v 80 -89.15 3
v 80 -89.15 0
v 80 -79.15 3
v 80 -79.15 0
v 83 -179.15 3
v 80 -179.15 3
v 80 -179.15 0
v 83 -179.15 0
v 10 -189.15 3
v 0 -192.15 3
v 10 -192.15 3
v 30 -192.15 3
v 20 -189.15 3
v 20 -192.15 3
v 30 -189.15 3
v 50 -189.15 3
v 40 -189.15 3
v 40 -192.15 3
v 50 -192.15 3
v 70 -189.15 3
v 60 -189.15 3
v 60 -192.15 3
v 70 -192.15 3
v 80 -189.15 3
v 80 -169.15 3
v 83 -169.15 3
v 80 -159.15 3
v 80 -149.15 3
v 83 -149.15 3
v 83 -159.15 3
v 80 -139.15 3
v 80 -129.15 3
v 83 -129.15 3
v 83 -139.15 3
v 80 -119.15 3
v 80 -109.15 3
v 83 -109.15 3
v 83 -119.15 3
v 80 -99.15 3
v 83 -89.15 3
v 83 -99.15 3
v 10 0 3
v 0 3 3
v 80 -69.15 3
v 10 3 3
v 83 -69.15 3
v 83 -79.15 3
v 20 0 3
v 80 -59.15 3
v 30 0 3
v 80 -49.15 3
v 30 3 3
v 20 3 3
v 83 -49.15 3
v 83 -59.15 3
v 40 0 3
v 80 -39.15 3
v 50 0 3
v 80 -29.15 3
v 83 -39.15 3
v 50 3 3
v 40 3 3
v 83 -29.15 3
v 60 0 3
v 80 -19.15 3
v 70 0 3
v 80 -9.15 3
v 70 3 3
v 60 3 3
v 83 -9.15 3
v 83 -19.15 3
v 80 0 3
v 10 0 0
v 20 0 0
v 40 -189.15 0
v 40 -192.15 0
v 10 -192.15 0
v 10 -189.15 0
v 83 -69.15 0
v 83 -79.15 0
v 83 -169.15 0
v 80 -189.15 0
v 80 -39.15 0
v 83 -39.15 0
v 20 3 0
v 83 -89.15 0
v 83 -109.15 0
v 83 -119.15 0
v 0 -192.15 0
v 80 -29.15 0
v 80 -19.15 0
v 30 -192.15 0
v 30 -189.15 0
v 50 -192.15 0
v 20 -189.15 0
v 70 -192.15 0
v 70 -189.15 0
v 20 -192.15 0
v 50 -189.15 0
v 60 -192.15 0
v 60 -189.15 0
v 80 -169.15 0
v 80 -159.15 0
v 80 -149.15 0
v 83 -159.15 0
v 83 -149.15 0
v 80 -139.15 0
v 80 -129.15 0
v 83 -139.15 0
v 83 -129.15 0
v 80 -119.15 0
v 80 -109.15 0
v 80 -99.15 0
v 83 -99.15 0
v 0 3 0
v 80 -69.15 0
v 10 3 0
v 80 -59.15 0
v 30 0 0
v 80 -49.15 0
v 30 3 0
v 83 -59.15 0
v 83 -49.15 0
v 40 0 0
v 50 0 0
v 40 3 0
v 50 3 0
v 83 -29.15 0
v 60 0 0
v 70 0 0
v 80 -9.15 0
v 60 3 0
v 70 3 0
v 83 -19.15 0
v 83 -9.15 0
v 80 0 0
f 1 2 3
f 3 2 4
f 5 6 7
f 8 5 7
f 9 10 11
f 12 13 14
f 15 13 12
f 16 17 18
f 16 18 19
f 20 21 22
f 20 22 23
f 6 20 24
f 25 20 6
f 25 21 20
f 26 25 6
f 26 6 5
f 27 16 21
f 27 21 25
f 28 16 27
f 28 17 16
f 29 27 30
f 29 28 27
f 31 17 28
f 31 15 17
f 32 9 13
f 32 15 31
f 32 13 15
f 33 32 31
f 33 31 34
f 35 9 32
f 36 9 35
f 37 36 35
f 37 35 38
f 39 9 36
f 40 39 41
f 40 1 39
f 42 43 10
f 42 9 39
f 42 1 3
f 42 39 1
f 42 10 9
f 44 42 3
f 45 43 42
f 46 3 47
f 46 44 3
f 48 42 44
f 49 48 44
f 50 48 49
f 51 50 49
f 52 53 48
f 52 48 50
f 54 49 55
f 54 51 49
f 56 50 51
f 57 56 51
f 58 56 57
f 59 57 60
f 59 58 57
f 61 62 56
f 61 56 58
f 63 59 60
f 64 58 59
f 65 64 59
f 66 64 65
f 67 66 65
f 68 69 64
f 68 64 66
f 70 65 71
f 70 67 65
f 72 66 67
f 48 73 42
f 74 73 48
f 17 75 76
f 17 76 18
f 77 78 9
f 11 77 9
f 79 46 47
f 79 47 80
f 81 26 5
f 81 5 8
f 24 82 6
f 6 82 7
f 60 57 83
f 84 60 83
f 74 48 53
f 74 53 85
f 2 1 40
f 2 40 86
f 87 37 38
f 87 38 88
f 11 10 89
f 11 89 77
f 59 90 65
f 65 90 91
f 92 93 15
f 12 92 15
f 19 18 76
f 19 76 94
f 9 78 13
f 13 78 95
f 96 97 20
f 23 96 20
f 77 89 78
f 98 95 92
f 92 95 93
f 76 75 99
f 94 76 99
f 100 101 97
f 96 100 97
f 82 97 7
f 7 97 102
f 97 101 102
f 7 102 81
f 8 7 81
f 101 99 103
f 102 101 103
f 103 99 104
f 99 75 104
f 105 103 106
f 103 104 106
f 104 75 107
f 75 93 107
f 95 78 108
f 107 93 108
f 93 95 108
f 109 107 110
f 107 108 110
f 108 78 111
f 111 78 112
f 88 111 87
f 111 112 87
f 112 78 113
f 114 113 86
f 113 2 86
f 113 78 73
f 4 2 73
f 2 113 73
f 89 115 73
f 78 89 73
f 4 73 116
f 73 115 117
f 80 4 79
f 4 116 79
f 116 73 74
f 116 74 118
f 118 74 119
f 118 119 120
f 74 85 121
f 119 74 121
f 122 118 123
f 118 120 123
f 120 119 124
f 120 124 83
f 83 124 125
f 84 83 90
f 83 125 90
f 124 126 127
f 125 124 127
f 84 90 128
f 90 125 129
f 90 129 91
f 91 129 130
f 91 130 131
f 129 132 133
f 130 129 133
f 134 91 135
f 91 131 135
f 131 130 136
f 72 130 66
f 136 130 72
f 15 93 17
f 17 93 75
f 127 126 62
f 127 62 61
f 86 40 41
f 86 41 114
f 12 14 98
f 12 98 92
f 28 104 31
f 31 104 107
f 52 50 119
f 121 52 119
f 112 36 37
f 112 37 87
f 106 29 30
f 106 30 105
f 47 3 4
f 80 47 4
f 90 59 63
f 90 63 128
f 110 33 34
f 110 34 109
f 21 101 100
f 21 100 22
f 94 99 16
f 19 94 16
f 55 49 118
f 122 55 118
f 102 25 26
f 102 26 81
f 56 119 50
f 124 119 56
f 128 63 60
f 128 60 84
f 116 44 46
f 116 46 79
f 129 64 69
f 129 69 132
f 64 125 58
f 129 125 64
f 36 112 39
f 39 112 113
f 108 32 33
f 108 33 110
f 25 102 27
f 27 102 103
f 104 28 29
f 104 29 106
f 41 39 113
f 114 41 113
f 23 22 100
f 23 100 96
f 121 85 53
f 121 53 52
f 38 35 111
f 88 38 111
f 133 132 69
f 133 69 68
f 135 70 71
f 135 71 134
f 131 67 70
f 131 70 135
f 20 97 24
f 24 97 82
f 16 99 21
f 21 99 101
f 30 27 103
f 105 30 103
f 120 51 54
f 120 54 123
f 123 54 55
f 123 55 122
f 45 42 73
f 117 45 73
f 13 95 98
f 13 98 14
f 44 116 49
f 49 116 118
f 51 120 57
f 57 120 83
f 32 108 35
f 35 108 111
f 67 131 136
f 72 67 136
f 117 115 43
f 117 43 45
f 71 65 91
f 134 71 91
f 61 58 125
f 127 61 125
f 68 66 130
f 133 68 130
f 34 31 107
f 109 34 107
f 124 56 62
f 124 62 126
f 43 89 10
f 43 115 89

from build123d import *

# Parameters (mm, degrees)
ESQUISSE1_W                = 80
ESQUISSE1_H                = 189.15
BOSS_EXTRU_1_DEPTH         = 3
ESQUISSE3_W                = 10
ESQUISSE3_H                = 3
BOSS_EXTRU_2_DEPTH         = 3
R_P_TITION_LIN_AIRE1_COUNT = 4
R_P_TITION_LIN_AIRE1_PITCH = 20
ESQUISSE4_W                = 10
ESQUISSE4_H                = 3
BOSS_EXTRU_3_DEPTH         = 3
R_P_TITION_LIN_AIRE2_COUNT = 4
R_P_TITION_LIN_AIRE2_PITCH = 20
ESQUISSE5_W                = 3
ESQUISSE5_H                = 10
BOSS_EXTRU_4_DEPTH         = 3
R_P_TITION_LIN_AIRE3_COUNT = 9
R_P_TITION_LIN_AIRE3_PITCH = 20


with BuildPart() as part:
    # Esquisse1 → Boss.-Extru.1 (new body)
    with BuildSketch(Plane.XY):
        with Locations((40, -94.575)):
            Rectangle(ESQUISSE1_W, ESQUISSE1_H)
    extrude(amount=BOSS_EXTRU_1_DEPTH)

    # Esquisse3 → Boss.-Extru.2 (add)
    with BuildSketch(Plane(origin=(0, 0, 0), x_dir=(1, 0, 0), z_dir=(0, 1, 0))):
        with Locations((5, -1.5)):
            Rectangle(ESQUISSE3_W, ESQUISSE3_H)
    boss_extru_2 = extrude(amount=BOSS_EXTRU_2_DEPTH)

    # Répétition linéaire1: Boss.-Extru.2 ×4
    with Locations(*[(i * R_P_TITION_LIN_AIRE1_PITCH, 0, 0) for i in range(1, R_P_TITION_LIN_AIRE1_COUNT)]):
        add(boss_extru_2)

    # Esquisse4 → Boss.-Extru.3 (add)
    with BuildSketch(Plane.XZ.offset(189.15)):
        with Locations((5, 1.5)):
            Rectangle(ESQUISSE4_W, ESQUISSE4_H)
    boss_extru_3 = extrude(amount=BOSS_EXTRU_3_DEPTH)

    # Répétition linéaire2: Boss.-Extru.3 ×4
    with Locations(*[(i * R_P_TITION_LIN_AIRE2_PITCH, 0, 0) for i in range(1, R_P_TITION_LIN_AIRE2_COUNT)]):
        add(boss_extru_3)

    # Esquisse5 → Boss.-Extru.4 (add)
    with BuildSketch(Plane(origin=(80, 0, 0), x_dir=(0, 0, -1), z_dir=(1, 0, 0))):
        with Locations((-1.5, -174.15)):
            Rectangle(ESQUISSE5_W, ESQUISSE5_H)
    boss_extru_4 = extrude(amount=BOSS_EXTRU_4_DEPTH)

    # Répétition linéaire3: Boss.-Extru.4 ×9
    with Locations(*[(0, i * R_P_TITION_LIN_AIRE3_PITCH, 0) for i in range(1, R_P_TITION_LIN_AIRE3_COUNT)]):
        add(boss_extru_4)


solid = part.part
